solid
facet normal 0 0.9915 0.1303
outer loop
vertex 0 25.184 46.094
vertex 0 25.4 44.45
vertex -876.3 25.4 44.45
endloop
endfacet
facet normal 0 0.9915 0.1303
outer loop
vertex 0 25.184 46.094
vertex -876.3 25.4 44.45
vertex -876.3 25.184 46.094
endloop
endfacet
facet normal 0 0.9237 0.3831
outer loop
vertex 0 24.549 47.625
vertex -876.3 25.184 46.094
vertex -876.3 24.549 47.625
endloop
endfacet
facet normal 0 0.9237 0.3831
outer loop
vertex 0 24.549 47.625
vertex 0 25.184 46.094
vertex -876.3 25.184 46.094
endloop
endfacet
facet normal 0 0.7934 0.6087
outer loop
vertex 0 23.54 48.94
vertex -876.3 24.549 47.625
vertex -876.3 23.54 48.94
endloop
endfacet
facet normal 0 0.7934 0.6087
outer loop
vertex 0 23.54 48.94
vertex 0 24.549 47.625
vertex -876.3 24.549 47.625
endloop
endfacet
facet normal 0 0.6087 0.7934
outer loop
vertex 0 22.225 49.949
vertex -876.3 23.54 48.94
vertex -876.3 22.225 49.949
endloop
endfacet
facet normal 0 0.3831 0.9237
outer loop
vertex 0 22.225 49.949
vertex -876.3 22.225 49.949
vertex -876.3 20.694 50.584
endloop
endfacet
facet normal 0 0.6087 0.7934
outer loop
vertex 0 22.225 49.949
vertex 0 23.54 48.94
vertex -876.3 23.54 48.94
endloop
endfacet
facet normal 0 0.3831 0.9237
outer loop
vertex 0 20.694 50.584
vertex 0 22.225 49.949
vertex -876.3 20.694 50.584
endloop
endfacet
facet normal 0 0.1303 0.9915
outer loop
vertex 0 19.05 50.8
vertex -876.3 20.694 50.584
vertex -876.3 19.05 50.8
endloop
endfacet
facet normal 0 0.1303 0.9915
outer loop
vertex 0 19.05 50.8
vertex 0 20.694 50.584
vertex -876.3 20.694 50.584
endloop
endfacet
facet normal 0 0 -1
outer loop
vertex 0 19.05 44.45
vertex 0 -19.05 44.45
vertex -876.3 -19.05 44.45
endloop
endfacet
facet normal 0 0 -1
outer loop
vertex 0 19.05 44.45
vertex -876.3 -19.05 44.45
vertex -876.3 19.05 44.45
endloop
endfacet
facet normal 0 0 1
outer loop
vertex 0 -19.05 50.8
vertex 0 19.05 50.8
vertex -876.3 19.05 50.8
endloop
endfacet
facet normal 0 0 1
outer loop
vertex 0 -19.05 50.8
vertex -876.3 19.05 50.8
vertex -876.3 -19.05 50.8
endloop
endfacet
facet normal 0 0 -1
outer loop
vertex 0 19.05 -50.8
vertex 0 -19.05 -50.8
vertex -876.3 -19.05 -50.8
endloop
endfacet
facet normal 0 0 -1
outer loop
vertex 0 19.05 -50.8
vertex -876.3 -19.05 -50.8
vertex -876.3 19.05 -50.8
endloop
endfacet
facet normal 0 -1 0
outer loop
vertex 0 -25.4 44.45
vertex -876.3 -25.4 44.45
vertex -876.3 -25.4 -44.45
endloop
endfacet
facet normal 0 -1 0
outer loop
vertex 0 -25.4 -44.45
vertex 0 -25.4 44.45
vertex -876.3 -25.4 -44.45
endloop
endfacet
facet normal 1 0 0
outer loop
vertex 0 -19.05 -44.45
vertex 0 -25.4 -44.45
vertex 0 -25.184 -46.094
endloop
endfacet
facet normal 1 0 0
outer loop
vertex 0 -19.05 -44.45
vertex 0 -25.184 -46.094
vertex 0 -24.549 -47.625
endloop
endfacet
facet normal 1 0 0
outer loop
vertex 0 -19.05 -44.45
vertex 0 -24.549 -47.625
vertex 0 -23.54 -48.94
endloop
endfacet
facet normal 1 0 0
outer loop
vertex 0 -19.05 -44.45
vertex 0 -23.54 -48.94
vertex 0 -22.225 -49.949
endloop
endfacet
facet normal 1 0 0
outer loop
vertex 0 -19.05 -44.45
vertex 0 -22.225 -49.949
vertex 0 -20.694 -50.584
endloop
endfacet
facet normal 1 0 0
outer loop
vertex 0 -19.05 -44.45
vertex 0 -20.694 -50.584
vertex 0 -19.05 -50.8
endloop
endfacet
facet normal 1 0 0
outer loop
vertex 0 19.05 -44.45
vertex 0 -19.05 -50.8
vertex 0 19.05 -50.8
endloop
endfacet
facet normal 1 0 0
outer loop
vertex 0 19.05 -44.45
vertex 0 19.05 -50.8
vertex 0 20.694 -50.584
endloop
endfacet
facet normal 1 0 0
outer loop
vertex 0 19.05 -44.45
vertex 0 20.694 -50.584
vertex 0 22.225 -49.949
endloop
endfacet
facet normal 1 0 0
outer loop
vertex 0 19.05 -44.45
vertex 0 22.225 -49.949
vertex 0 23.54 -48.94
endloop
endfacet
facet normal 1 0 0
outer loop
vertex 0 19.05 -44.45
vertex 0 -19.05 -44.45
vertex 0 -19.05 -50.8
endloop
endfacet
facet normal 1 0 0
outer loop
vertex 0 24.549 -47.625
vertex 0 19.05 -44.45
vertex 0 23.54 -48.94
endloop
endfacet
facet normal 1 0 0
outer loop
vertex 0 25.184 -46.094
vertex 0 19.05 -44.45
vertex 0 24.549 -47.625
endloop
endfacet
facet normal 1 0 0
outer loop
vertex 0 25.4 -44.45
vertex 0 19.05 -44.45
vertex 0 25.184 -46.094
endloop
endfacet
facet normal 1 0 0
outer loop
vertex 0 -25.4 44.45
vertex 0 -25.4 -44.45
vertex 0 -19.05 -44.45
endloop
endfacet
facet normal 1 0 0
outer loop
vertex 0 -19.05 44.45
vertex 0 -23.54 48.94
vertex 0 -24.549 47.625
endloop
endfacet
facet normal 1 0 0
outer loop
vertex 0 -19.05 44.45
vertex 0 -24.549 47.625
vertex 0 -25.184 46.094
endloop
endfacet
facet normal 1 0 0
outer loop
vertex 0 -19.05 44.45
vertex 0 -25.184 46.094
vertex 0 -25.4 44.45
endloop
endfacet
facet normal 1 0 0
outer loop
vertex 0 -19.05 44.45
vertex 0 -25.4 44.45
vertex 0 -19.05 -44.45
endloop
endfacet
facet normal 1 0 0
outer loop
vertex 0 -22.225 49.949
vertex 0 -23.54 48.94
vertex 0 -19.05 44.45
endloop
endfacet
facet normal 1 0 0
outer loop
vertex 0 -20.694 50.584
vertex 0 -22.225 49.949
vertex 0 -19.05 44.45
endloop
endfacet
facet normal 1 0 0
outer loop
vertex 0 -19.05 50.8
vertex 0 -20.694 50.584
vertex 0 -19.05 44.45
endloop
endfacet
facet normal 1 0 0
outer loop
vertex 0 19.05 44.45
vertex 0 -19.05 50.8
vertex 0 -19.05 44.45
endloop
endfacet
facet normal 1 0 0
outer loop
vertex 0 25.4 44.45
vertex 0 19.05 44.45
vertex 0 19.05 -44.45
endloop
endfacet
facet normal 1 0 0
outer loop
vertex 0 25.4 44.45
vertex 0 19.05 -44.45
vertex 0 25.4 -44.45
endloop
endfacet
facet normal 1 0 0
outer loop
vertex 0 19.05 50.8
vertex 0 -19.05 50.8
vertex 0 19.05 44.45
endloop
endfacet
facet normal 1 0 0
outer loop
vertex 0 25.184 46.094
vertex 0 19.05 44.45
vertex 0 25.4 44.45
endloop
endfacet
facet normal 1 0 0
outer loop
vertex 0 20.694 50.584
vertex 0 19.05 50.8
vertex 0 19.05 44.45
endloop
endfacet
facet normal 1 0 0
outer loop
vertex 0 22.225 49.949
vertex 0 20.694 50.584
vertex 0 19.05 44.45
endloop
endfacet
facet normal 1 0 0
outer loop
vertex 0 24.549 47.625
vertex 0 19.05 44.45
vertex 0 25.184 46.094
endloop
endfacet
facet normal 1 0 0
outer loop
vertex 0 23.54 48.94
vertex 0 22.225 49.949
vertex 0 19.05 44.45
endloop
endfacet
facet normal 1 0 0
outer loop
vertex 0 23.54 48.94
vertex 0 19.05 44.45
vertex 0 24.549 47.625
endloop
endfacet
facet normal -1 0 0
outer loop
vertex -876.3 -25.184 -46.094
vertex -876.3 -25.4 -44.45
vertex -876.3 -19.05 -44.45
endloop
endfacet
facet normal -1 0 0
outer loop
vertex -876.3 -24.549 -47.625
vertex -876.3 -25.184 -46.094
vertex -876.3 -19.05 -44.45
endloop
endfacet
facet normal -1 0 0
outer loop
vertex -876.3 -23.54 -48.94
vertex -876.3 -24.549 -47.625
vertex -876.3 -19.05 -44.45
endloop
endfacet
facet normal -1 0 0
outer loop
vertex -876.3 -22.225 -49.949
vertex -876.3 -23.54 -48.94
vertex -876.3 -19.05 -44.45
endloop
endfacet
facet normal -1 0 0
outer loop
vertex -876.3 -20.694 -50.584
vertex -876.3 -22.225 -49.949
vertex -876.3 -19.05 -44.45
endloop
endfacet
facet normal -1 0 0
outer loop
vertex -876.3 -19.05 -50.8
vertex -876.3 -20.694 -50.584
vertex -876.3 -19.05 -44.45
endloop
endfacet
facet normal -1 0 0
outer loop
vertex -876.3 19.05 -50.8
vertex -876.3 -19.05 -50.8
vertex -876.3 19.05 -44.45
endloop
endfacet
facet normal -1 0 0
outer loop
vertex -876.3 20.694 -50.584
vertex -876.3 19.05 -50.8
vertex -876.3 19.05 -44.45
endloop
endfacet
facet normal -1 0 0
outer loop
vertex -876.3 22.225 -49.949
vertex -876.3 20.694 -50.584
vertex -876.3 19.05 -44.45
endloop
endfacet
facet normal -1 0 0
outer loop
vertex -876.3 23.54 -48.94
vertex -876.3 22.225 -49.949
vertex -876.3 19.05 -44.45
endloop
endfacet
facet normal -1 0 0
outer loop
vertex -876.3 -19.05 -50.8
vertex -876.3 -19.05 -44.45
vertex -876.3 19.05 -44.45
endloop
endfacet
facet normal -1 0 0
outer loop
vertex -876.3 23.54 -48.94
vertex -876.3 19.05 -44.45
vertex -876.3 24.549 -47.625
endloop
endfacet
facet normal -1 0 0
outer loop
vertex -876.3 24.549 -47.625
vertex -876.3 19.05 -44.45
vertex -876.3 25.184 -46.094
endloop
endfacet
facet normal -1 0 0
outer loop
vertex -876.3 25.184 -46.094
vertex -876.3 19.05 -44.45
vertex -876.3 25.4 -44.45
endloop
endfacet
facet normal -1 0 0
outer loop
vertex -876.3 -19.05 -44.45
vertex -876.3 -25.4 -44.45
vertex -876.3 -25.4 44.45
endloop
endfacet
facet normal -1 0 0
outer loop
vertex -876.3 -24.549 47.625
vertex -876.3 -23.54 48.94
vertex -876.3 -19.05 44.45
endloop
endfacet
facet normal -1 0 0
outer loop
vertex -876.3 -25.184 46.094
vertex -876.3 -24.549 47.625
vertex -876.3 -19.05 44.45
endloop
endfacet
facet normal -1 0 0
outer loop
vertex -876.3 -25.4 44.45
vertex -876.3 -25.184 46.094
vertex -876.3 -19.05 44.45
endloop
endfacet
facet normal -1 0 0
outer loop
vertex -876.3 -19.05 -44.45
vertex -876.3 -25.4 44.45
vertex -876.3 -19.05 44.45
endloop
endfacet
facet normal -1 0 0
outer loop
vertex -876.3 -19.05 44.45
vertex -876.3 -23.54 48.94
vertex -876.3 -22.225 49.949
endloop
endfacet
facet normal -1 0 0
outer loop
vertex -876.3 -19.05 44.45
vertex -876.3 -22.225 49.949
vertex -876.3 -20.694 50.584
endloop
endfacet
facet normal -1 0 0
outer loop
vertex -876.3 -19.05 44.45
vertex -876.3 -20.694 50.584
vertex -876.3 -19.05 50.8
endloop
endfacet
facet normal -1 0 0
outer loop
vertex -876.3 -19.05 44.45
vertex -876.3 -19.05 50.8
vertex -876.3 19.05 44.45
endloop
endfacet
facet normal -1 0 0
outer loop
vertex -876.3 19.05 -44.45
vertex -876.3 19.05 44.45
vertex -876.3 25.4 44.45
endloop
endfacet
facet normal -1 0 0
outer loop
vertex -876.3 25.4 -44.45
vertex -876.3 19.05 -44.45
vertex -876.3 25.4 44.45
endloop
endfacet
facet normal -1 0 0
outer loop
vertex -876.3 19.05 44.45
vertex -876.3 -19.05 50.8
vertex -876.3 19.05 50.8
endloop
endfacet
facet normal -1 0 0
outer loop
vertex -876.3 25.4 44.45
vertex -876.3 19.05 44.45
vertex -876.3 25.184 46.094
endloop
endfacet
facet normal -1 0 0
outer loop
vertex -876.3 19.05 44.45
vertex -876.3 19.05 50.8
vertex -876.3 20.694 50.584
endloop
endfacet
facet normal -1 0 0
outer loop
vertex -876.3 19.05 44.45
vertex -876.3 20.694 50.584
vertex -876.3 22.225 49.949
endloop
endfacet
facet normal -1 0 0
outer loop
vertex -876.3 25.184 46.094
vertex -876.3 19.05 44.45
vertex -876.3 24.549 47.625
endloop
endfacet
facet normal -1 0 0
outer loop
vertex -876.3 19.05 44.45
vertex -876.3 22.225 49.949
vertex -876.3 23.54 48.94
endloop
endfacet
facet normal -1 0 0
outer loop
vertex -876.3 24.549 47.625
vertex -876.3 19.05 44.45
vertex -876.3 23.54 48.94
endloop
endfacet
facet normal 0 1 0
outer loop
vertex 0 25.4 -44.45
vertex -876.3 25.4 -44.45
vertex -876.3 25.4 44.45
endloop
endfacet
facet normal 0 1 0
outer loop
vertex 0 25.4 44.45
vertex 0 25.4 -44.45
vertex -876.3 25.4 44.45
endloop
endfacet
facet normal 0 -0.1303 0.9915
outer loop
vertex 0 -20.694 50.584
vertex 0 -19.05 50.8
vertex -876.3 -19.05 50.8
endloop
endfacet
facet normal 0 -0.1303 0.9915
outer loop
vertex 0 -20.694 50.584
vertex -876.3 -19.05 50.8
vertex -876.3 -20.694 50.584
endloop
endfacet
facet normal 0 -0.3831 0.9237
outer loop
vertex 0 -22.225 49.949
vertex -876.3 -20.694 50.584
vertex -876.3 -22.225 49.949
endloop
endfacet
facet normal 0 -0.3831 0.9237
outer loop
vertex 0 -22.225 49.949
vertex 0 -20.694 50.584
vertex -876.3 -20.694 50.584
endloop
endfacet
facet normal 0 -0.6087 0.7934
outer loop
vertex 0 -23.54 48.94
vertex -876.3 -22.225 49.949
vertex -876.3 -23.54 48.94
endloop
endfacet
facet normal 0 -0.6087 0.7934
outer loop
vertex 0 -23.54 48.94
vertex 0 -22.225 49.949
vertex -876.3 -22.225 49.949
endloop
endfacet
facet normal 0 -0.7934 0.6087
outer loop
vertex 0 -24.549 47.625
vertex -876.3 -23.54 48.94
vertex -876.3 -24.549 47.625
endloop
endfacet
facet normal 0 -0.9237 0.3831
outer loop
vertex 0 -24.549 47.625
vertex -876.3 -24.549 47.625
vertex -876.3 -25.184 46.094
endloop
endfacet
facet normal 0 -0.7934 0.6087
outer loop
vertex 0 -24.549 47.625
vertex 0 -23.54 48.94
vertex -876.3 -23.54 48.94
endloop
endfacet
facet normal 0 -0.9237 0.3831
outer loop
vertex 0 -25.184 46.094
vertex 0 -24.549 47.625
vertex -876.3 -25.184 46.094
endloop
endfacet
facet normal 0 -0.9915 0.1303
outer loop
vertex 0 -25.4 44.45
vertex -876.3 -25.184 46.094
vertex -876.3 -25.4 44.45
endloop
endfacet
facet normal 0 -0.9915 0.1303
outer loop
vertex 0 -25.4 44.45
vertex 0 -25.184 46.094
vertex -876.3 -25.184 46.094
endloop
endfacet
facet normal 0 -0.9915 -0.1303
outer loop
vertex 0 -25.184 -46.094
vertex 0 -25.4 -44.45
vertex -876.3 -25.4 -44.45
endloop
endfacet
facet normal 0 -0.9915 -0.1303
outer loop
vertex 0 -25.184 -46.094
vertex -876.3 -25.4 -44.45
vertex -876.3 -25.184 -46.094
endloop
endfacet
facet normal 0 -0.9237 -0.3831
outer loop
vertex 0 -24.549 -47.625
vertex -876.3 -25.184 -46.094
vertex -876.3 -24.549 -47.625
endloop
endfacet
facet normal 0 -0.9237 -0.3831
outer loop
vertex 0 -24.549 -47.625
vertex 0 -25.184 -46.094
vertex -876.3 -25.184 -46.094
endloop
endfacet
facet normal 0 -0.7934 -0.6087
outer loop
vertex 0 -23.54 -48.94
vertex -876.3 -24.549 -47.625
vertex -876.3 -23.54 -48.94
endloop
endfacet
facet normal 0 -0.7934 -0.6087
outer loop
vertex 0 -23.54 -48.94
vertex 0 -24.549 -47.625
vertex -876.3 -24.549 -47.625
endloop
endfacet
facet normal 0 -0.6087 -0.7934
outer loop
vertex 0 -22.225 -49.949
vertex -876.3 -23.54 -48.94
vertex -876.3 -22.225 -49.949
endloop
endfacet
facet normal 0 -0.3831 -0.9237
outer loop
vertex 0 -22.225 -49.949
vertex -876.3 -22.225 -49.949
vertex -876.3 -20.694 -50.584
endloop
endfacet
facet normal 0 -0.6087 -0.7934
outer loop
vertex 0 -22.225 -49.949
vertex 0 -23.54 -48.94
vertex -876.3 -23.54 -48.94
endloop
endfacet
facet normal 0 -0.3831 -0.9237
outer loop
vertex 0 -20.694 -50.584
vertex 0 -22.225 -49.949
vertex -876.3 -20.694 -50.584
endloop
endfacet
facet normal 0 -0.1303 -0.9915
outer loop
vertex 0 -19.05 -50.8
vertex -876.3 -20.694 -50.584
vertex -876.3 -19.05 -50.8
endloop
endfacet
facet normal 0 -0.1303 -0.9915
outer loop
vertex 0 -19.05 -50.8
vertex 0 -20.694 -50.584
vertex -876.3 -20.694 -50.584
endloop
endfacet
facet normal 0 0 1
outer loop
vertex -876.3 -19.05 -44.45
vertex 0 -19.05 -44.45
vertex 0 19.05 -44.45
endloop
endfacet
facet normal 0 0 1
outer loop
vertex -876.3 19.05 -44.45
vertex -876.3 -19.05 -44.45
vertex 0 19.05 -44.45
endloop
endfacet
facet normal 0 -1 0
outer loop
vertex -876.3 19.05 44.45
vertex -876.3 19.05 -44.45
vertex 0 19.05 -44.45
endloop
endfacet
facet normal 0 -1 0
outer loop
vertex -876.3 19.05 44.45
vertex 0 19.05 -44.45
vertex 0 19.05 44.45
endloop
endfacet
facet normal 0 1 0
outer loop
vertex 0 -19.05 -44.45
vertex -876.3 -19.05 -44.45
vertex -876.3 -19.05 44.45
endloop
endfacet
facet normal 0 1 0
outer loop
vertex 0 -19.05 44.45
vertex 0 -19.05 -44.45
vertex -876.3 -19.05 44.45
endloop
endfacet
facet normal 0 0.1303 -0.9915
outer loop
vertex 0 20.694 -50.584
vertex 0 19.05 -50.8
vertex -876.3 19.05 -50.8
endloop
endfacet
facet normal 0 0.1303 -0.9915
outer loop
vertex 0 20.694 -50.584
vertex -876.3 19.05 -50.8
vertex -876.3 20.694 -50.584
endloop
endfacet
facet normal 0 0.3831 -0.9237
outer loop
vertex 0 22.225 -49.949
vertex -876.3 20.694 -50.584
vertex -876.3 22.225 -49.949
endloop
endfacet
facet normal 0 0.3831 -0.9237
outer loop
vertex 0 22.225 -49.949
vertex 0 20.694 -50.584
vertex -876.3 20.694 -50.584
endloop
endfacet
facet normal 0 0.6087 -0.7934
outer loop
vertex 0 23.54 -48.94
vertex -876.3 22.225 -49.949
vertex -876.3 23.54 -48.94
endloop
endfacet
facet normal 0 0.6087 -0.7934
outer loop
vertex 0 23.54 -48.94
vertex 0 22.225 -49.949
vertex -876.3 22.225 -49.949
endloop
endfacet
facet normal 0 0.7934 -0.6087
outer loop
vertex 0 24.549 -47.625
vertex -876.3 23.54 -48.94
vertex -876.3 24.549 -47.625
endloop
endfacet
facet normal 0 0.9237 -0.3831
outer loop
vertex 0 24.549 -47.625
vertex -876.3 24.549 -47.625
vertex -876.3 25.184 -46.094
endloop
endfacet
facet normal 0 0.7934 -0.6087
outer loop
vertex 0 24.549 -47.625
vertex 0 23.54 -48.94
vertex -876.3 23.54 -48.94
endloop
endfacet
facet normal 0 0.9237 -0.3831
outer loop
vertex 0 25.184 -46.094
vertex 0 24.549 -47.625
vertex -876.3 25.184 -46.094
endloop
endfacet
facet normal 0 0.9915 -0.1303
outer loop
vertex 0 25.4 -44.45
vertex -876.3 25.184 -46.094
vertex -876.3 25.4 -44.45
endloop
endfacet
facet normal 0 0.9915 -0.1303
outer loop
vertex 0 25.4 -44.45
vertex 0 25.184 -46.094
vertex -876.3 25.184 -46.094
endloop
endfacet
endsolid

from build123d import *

# Parameters (mm, degrees)
F0_W     = 38.1
F0_H     = 88.9
F1_DEPTH = 876.3


with BuildPart() as f1:
    # F0 (on Right) → F1 (new body)
    with BuildSketch(Plane.YZ):
        with BuildLine():
            ThreePointArc((25.4, 44.45), (23.540128, 48.940128), (19.05, 50.8))
            Line((19.05, 50.8), (-19.05, 50.8))
            ThreePointArc((-19.05, 50.8), (-23.540128, 48.940128), (-25.4, 44.45))
            Line((-25.4, 44.45), (-25.4, -44.45))
            ThreePointArc((-25.4, -44.45), (-23.540128, -48.940128), (-19.05, -50.8))
            Line((-19.05, -50.8), (19.05, -50.8))
            ThreePointArc((19.05, -50.8), (23.540128, -48.940128), (25.4, -44.45))
            Line((25.4, -44.45), (25.4, 44.45))
        make_face()
        Rectangle(F0_W, F0_H, mode=Mode.SUBTRACT)
    extrude(amount=-F1_DEPTH)


solid = f1.part
